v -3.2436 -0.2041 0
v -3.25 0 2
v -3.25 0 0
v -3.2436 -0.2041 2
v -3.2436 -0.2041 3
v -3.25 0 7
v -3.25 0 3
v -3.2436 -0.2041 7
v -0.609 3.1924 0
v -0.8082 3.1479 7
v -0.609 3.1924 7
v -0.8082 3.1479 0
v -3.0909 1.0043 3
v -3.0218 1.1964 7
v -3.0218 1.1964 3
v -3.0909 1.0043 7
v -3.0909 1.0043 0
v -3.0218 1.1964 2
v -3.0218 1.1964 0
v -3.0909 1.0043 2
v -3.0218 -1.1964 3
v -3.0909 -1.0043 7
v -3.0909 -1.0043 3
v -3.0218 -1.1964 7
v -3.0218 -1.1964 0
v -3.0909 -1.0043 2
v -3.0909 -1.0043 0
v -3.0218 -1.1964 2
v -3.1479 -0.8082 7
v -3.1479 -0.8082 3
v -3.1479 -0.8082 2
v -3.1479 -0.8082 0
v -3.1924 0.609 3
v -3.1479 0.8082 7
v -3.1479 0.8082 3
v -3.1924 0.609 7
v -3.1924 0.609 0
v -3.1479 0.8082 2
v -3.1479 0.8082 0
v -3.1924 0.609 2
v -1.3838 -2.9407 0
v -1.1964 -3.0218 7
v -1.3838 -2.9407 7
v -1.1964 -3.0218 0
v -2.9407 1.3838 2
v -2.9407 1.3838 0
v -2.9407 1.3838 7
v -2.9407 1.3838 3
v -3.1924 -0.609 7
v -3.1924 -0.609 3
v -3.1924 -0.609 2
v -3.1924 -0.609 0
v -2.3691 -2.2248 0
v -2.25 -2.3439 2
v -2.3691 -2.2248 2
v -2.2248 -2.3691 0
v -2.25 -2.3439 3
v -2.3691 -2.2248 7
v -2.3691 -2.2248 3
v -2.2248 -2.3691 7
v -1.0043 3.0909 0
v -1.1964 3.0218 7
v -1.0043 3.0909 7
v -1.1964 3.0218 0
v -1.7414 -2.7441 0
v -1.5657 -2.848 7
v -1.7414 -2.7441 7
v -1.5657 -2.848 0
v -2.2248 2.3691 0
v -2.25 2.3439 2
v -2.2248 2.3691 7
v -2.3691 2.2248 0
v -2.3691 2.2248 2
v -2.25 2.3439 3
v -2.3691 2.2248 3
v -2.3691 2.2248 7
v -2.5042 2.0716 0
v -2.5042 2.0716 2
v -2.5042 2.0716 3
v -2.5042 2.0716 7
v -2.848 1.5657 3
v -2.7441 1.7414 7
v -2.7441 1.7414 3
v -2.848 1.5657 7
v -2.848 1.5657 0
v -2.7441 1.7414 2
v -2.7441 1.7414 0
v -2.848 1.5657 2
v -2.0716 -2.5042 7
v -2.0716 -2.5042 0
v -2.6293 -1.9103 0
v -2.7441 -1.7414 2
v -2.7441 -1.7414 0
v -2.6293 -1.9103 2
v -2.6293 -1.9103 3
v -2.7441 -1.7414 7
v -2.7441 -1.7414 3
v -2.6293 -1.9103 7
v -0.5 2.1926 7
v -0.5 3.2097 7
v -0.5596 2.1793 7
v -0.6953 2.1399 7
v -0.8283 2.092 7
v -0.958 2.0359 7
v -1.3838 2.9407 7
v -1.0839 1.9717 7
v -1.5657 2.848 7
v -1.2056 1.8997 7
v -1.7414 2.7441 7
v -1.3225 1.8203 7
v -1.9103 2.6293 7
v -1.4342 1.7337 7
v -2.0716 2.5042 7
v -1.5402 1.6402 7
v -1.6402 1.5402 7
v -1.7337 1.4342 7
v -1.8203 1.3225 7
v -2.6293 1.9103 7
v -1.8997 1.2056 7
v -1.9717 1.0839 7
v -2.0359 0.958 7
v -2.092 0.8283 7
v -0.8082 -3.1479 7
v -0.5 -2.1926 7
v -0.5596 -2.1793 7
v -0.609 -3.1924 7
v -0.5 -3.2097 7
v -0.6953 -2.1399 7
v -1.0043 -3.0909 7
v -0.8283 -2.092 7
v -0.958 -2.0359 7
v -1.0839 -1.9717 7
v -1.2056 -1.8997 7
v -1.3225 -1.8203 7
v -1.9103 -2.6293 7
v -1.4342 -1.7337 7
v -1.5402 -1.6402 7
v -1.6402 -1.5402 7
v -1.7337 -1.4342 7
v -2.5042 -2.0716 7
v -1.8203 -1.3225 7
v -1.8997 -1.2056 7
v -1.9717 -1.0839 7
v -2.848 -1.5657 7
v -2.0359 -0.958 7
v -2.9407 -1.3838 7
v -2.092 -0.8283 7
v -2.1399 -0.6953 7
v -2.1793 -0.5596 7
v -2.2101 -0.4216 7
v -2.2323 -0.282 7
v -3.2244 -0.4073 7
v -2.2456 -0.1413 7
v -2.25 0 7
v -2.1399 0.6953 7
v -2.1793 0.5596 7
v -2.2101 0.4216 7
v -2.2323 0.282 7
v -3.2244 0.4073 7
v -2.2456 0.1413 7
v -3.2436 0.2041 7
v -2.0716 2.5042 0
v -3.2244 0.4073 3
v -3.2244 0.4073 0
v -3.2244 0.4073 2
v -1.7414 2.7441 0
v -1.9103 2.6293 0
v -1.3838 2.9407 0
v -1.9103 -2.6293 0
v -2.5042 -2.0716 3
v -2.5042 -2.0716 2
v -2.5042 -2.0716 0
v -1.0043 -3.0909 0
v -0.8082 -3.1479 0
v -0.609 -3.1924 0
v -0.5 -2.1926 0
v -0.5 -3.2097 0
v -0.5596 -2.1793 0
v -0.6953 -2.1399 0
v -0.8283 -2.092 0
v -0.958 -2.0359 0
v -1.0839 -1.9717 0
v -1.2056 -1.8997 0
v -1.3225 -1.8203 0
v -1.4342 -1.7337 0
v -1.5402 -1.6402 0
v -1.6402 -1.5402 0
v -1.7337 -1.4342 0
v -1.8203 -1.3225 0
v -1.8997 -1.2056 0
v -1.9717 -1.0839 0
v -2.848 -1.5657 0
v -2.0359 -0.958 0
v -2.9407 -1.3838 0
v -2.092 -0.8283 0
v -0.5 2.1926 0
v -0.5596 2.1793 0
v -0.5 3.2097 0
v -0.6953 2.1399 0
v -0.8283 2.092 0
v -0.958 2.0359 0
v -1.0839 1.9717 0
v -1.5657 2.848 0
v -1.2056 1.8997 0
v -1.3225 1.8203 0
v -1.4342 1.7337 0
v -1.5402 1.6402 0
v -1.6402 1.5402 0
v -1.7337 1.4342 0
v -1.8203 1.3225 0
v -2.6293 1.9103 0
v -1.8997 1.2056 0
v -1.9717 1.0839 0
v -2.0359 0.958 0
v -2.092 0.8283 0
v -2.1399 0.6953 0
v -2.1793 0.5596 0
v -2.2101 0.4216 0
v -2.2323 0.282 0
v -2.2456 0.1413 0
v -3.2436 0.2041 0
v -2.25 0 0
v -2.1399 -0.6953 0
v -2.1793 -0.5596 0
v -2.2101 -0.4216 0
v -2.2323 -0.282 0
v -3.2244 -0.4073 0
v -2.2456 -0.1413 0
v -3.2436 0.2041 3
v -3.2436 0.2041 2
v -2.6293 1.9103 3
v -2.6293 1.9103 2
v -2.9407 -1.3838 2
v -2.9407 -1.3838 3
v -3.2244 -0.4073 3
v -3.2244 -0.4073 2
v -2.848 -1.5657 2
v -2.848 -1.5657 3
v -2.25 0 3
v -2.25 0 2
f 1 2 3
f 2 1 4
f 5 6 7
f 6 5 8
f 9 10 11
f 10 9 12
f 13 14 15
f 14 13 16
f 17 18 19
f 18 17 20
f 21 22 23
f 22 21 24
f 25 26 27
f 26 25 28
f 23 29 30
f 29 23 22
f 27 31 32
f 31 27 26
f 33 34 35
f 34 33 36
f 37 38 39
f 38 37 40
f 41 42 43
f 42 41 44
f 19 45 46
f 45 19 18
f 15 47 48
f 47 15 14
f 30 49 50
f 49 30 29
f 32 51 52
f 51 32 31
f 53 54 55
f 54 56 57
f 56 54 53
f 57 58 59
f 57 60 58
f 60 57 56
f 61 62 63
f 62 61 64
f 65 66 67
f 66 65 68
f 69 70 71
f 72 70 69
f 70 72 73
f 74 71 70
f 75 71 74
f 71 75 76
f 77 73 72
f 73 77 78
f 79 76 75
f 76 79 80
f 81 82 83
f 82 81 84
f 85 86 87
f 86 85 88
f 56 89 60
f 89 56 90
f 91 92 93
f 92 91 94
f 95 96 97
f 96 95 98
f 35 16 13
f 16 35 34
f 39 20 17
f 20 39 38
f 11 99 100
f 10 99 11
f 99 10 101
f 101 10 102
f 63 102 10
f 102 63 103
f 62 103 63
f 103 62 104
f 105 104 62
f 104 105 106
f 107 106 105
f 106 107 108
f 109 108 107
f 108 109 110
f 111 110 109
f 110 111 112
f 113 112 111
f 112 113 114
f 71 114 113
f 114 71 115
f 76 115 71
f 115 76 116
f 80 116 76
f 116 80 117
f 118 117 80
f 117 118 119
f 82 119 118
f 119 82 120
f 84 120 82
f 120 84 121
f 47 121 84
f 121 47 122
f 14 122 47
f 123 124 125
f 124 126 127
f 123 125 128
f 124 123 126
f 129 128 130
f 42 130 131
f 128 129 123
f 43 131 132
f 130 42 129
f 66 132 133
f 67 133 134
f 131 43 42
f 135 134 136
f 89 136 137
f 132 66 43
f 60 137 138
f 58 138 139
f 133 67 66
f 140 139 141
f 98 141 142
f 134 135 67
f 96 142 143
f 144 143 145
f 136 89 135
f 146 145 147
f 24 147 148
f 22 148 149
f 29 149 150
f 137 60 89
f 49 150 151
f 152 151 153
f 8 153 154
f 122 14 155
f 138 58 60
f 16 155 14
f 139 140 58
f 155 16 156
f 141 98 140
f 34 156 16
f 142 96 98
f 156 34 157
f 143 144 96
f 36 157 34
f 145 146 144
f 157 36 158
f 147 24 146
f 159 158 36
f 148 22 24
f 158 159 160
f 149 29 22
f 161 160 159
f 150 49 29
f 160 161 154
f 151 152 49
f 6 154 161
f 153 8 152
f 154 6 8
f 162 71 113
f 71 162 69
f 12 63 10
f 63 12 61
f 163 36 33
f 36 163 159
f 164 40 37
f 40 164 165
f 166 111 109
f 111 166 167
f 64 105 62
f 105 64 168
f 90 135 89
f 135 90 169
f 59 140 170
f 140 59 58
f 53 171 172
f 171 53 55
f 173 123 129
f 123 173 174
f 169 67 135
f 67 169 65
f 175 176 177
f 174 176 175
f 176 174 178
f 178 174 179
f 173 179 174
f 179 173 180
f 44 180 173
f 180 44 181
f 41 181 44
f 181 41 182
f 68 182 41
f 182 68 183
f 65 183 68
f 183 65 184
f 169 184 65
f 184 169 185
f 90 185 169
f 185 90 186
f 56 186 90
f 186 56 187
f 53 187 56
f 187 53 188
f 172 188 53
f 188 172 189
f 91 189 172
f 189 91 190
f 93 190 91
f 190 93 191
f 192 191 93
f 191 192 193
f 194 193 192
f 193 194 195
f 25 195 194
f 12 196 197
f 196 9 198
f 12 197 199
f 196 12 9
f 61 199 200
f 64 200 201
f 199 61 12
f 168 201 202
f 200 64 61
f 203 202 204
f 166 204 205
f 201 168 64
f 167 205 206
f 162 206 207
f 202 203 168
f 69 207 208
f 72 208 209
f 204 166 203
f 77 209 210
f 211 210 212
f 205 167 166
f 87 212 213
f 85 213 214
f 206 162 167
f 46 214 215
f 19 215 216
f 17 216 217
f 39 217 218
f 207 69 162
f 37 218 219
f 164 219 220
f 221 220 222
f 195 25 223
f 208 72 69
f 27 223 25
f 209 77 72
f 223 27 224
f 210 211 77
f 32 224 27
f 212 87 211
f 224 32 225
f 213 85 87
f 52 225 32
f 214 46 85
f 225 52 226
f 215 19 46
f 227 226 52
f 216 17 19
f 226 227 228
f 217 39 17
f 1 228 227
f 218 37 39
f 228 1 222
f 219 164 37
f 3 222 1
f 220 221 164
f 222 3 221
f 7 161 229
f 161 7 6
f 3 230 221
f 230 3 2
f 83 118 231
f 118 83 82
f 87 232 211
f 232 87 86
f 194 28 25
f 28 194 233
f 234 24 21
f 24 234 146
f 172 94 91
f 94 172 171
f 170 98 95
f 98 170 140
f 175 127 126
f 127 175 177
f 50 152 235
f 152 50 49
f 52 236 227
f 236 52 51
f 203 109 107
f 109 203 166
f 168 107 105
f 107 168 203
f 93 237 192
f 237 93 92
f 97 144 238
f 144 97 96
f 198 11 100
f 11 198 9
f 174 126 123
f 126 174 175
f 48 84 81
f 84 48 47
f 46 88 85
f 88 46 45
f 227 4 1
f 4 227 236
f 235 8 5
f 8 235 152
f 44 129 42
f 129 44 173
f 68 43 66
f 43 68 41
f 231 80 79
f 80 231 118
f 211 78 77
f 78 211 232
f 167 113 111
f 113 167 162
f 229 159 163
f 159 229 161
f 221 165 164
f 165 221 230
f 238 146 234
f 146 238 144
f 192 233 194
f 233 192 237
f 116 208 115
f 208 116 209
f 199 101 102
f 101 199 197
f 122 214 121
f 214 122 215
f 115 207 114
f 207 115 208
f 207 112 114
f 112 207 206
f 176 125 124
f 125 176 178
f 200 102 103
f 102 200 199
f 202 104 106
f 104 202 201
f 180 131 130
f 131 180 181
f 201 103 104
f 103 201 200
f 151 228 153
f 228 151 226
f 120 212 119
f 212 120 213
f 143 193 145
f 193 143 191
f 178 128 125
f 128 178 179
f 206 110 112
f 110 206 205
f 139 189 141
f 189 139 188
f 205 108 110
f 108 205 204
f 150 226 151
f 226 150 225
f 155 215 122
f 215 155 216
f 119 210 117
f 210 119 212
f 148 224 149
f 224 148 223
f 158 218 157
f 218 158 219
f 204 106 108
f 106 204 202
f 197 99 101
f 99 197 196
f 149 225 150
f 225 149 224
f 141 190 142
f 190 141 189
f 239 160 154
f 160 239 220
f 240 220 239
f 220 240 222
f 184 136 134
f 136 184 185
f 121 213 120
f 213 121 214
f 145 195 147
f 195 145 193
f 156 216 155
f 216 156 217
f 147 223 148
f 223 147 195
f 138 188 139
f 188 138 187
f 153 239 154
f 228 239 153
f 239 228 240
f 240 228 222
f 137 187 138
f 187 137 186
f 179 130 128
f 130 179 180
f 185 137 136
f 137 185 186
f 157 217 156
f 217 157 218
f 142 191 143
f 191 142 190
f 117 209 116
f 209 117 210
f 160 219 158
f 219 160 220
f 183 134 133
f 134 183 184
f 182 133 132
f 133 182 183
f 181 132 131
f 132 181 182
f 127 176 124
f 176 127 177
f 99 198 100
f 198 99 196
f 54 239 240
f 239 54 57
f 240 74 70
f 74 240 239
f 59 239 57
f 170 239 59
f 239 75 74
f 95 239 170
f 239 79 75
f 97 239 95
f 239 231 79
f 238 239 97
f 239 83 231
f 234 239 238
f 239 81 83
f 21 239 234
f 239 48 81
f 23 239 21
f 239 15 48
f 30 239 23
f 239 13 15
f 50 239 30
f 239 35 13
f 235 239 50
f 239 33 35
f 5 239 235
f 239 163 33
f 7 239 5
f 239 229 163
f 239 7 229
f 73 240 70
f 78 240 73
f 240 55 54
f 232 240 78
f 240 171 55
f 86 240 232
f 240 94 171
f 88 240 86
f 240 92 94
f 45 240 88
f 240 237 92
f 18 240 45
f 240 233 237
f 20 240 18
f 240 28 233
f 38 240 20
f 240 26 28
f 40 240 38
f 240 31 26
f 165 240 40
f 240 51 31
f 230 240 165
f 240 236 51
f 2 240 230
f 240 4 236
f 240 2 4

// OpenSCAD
$fn=100;

difference() {
    cylinder(h=7, d=6.5);
    
    cylinder(h=100, d=4.5);
    translate([-0.5, -5, -5])
    cube([15, 15, 15]);
    
    translate([-6.5/2+0.5, 0, 2.5])
    cube([1, 100, 1], center=true);
}
